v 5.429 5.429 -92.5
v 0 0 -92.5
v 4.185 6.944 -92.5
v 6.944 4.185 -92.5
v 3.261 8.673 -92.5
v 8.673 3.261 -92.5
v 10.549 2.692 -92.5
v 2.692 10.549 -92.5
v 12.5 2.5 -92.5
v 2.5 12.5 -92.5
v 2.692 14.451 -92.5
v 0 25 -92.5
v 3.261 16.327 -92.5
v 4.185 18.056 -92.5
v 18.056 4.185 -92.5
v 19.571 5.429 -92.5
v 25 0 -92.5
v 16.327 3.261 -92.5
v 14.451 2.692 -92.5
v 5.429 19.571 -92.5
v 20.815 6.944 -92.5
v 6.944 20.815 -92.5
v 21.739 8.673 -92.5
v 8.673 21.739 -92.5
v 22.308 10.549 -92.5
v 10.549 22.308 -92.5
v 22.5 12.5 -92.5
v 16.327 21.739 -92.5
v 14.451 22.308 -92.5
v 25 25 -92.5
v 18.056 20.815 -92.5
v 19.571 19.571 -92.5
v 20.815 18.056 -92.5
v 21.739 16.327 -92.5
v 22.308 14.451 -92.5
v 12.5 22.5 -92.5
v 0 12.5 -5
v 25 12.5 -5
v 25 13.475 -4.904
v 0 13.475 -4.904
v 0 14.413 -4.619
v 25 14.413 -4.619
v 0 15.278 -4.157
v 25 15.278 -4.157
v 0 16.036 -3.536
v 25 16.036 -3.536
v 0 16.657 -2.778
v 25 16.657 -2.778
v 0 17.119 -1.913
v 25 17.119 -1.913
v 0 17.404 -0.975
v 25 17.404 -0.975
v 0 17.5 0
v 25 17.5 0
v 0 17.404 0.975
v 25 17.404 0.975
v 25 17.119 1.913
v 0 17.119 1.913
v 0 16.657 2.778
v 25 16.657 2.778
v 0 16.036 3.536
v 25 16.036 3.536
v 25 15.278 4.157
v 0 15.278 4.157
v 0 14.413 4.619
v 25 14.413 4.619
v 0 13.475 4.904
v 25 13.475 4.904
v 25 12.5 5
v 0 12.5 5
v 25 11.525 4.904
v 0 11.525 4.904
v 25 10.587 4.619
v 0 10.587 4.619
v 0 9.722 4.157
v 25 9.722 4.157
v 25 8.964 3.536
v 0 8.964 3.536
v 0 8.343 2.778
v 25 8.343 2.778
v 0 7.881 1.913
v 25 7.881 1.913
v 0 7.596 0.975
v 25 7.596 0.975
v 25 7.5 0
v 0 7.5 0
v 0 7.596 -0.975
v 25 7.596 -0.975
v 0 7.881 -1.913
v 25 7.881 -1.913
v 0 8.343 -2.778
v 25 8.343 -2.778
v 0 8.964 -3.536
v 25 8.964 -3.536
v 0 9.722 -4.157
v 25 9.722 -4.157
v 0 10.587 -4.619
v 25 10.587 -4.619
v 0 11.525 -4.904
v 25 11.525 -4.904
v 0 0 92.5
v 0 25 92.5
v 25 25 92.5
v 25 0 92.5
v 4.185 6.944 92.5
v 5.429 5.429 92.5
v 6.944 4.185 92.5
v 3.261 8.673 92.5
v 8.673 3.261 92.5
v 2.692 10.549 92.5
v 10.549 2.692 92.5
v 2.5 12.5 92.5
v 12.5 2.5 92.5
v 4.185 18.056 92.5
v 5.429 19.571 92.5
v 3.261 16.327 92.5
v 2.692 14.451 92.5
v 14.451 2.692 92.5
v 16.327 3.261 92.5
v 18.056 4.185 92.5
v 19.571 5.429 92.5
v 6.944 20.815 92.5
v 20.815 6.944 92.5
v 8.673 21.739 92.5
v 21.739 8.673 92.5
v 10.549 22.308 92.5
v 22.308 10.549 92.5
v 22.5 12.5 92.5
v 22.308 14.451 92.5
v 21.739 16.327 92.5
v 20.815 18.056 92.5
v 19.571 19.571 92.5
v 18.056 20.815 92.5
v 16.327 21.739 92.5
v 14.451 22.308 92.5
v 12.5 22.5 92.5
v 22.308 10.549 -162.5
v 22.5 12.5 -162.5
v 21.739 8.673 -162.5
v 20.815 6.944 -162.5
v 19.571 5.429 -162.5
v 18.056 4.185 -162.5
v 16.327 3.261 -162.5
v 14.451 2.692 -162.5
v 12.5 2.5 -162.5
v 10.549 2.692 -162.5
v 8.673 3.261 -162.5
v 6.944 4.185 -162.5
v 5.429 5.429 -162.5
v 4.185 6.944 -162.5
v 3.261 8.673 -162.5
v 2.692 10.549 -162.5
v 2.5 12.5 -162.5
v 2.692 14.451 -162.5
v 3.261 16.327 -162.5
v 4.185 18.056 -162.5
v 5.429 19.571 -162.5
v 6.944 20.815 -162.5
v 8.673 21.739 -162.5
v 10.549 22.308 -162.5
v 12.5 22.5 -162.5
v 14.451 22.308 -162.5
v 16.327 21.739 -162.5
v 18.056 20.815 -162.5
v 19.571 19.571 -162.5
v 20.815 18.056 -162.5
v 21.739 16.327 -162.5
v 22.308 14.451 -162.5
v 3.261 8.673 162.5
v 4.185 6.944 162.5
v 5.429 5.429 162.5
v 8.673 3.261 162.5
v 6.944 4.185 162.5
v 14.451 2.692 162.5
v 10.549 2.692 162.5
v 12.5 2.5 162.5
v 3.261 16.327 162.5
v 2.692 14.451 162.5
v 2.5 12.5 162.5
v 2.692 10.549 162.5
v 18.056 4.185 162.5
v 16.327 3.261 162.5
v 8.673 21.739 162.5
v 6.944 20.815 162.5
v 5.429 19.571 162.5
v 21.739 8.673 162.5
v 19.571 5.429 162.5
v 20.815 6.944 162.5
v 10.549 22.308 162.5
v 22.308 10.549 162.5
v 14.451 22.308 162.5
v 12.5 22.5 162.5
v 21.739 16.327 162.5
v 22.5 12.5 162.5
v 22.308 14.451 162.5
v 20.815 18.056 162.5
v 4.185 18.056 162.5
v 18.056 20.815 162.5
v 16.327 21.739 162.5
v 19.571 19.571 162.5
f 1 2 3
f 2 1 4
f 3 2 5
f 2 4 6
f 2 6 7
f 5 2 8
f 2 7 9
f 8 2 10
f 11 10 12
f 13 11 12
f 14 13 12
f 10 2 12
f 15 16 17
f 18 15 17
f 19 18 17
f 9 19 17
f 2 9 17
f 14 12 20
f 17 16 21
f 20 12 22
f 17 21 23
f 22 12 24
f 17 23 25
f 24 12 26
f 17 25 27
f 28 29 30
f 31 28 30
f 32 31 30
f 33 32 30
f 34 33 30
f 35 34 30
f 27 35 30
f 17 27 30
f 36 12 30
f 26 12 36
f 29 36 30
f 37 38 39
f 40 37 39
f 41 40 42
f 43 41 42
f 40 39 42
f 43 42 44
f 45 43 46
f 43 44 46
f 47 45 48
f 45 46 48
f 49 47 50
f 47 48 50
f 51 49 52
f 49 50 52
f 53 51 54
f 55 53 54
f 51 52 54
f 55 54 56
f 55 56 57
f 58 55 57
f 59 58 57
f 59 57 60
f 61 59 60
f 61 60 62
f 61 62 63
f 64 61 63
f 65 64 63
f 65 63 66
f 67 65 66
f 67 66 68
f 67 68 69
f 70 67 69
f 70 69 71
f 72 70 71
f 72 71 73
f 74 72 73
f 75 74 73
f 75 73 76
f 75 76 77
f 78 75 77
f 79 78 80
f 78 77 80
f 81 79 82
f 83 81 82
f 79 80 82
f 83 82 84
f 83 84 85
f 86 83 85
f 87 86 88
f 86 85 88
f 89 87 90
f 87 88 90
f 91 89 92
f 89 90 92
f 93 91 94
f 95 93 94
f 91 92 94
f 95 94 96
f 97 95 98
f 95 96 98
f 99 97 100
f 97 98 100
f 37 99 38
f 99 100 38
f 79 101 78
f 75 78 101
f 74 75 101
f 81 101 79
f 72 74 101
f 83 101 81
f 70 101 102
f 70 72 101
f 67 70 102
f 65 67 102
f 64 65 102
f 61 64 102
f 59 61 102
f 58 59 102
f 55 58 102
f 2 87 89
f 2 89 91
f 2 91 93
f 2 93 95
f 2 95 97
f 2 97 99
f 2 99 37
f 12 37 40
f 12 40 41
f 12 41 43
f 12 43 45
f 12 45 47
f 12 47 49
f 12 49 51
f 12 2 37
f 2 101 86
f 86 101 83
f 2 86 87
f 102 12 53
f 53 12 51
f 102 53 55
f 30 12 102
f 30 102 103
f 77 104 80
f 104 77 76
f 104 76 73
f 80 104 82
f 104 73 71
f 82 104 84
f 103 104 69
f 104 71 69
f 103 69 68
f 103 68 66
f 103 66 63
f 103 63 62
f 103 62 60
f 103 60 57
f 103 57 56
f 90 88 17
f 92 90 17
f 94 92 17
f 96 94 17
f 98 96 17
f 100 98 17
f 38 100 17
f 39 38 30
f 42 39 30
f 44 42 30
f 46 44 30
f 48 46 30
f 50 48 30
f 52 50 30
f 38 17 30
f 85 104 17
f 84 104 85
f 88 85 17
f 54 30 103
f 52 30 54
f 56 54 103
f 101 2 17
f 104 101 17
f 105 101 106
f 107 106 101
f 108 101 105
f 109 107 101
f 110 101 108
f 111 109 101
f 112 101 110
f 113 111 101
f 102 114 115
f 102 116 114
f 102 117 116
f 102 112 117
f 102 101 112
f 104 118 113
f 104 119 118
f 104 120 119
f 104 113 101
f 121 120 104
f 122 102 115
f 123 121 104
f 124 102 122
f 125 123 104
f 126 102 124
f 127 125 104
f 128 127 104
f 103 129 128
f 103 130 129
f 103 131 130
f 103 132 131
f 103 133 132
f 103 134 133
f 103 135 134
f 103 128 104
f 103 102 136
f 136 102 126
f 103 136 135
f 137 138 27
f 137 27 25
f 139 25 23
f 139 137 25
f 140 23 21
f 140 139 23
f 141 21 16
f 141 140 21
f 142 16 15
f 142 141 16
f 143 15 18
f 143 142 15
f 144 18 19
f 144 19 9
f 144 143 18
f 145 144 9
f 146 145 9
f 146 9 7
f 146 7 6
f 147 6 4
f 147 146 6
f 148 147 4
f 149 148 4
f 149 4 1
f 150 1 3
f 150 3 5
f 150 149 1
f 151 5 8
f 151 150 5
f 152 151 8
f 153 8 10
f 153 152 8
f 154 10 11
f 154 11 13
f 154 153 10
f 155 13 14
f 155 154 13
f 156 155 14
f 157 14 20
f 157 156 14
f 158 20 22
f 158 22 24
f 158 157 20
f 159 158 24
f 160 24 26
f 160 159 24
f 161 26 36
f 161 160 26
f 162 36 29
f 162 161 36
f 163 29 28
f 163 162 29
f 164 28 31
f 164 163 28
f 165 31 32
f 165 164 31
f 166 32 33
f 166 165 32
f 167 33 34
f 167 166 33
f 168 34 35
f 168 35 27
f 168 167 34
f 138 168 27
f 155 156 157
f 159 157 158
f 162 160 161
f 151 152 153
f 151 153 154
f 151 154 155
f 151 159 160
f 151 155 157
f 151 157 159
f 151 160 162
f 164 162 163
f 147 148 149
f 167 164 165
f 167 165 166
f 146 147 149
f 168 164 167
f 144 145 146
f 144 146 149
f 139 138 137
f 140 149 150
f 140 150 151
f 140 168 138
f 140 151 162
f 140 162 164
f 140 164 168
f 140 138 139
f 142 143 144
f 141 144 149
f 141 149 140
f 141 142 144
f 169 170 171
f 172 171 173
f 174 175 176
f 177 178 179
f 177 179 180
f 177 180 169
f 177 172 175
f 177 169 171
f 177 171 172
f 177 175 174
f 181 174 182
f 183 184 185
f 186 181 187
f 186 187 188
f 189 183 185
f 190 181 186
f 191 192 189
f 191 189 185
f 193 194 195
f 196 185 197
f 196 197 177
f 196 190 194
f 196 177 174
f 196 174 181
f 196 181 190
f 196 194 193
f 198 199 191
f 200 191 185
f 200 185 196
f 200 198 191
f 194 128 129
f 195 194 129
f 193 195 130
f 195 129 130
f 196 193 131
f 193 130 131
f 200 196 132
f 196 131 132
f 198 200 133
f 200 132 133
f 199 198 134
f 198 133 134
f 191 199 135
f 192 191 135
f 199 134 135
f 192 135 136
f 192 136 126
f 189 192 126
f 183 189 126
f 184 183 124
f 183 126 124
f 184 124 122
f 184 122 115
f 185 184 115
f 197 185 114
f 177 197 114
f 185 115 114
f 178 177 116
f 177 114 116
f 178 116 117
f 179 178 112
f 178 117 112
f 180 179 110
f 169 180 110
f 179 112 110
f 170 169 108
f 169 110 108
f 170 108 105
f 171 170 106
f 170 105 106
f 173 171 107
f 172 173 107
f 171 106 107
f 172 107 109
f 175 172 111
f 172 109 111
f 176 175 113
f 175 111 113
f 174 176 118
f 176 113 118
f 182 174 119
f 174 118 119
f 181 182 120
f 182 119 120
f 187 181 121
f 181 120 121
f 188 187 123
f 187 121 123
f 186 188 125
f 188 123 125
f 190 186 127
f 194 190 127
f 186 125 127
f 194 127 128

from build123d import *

# Parameters (mm, degrees)
BOSS_EXTRUDE1_DEPTH      = 92.5
BOSS_EXTRUDE1_DEPTH_BACK = 92.5
SKETCH1_W                = 25
SKETCH1_H                = 25
SKETCH2_R                = 5
CUT_EXTRUDE1_DEPTH       = 100.026511602
SKETCH3_R                = 10
BOSS_EXTRUDE2_DEPTH      = 70
BOSS_EXTRUDE3_START      = 70
BOSS_EXTRUDE3_DEPTH      = 70


with BuildPart() as part:
    # Sketch1 → Boss-Extrude1 (new, two sides: drawn at the far end of the back side and taken through both)
    with BuildSketch(Plane.XY.offset(-BOSS_EXTRUDE1_DEPTH_BACK)):
        with Locations((12.5, 12.5)):
            Rectangle(SKETCH1_W, SKETCH1_H)
    extrude(amount=BOSS_EXTRUDE1_DEPTH + BOSS_EXTRUDE1_DEPTH_BACK)

    # Sketch2 → Cut-Extrude1 (cut, through all)
    with BuildSketch(Plane(origin=(25, 0, 0), x_dir=(0, 0, -1), z_dir=(1, 0, 0))):
        with Locations((0, 12.5)):
            Circle(SKETCH2_R)
    extrude(amount=-CUT_EXTRUDE1_DEPTH, mode=Mode.SUBTRACT)

    # Sketch3 → Boss-Extrude2 (add)
    with BuildSketch(Plane.XY.offset(92.5)):
        with Locations((12.5, 12.5)):
            Circle(SKETCH3_R)
    extrude(amount=BOSS_EXTRUDE2_DEPTH)

    # Sketch4 → Boss-Extrude3 (add)
    with BuildSketch(Plane(origin=(0, 0, -92.5), x_dir=(-1, 0, 0), z_dir=(0, 0, -1)).offset(BOSS_EXTRUDE3_START)):
        with BuildLine():
            ThreePointArc((-22.5, 12.5), (-12.5, 2.5), (-2.5, 12.5))
            ThreePointArc((-2.5, 12.5), (-12.5, 22.5), (-22.5, 12.5))
        make_face()
    extrude(amount=-BOSS_EXTRUDE3_DEPTH)


solid = part.part
